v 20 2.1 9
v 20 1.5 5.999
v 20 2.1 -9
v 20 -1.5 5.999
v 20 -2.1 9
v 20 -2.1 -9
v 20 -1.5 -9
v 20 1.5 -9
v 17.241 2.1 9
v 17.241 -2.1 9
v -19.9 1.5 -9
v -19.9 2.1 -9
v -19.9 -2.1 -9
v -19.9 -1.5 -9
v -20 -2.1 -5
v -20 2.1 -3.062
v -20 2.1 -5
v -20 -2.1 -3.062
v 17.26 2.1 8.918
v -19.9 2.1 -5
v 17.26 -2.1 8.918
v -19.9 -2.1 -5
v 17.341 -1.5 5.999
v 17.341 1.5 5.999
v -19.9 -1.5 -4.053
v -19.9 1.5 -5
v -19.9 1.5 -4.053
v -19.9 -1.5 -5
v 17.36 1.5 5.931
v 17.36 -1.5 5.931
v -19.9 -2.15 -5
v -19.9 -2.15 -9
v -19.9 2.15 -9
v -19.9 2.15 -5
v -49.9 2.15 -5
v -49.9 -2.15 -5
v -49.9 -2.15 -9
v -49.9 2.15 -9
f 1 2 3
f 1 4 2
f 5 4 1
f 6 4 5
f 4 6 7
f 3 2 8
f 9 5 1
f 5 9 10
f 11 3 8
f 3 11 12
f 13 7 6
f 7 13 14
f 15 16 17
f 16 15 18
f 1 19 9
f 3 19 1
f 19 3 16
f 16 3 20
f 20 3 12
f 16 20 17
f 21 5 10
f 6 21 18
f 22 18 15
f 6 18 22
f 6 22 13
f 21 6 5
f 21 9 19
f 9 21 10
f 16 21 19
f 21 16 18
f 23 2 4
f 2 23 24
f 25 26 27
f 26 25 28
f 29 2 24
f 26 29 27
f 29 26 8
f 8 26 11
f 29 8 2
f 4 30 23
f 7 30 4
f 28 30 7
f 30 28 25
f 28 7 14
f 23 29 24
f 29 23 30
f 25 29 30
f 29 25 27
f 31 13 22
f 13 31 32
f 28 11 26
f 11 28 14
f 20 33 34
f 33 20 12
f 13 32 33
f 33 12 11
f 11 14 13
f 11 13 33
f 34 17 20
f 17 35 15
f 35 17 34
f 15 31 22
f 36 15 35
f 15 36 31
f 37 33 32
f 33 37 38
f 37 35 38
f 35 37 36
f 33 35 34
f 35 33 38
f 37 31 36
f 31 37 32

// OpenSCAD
translate([-34.9, 0, -7]) cube([30, 4.3, 4], true);

difference() {
    scale([1, 1.4, 1.2]) difference() {
        cube([40, 3, 15], true);
        translate([-4, 0, 9.5]) rotate([0, -15, 0]) cube([40, 4, 15], true);
    }
 
    #translate([0.1, 0, -1.501]) caliper();   
}

module caliper() {
    difference() {
        cube([40, 3, 15], true);
        translate([-4, 0, 9.5]) rotate([0, -15, 0]) cube([40, 4, 15], true);
    }
}
